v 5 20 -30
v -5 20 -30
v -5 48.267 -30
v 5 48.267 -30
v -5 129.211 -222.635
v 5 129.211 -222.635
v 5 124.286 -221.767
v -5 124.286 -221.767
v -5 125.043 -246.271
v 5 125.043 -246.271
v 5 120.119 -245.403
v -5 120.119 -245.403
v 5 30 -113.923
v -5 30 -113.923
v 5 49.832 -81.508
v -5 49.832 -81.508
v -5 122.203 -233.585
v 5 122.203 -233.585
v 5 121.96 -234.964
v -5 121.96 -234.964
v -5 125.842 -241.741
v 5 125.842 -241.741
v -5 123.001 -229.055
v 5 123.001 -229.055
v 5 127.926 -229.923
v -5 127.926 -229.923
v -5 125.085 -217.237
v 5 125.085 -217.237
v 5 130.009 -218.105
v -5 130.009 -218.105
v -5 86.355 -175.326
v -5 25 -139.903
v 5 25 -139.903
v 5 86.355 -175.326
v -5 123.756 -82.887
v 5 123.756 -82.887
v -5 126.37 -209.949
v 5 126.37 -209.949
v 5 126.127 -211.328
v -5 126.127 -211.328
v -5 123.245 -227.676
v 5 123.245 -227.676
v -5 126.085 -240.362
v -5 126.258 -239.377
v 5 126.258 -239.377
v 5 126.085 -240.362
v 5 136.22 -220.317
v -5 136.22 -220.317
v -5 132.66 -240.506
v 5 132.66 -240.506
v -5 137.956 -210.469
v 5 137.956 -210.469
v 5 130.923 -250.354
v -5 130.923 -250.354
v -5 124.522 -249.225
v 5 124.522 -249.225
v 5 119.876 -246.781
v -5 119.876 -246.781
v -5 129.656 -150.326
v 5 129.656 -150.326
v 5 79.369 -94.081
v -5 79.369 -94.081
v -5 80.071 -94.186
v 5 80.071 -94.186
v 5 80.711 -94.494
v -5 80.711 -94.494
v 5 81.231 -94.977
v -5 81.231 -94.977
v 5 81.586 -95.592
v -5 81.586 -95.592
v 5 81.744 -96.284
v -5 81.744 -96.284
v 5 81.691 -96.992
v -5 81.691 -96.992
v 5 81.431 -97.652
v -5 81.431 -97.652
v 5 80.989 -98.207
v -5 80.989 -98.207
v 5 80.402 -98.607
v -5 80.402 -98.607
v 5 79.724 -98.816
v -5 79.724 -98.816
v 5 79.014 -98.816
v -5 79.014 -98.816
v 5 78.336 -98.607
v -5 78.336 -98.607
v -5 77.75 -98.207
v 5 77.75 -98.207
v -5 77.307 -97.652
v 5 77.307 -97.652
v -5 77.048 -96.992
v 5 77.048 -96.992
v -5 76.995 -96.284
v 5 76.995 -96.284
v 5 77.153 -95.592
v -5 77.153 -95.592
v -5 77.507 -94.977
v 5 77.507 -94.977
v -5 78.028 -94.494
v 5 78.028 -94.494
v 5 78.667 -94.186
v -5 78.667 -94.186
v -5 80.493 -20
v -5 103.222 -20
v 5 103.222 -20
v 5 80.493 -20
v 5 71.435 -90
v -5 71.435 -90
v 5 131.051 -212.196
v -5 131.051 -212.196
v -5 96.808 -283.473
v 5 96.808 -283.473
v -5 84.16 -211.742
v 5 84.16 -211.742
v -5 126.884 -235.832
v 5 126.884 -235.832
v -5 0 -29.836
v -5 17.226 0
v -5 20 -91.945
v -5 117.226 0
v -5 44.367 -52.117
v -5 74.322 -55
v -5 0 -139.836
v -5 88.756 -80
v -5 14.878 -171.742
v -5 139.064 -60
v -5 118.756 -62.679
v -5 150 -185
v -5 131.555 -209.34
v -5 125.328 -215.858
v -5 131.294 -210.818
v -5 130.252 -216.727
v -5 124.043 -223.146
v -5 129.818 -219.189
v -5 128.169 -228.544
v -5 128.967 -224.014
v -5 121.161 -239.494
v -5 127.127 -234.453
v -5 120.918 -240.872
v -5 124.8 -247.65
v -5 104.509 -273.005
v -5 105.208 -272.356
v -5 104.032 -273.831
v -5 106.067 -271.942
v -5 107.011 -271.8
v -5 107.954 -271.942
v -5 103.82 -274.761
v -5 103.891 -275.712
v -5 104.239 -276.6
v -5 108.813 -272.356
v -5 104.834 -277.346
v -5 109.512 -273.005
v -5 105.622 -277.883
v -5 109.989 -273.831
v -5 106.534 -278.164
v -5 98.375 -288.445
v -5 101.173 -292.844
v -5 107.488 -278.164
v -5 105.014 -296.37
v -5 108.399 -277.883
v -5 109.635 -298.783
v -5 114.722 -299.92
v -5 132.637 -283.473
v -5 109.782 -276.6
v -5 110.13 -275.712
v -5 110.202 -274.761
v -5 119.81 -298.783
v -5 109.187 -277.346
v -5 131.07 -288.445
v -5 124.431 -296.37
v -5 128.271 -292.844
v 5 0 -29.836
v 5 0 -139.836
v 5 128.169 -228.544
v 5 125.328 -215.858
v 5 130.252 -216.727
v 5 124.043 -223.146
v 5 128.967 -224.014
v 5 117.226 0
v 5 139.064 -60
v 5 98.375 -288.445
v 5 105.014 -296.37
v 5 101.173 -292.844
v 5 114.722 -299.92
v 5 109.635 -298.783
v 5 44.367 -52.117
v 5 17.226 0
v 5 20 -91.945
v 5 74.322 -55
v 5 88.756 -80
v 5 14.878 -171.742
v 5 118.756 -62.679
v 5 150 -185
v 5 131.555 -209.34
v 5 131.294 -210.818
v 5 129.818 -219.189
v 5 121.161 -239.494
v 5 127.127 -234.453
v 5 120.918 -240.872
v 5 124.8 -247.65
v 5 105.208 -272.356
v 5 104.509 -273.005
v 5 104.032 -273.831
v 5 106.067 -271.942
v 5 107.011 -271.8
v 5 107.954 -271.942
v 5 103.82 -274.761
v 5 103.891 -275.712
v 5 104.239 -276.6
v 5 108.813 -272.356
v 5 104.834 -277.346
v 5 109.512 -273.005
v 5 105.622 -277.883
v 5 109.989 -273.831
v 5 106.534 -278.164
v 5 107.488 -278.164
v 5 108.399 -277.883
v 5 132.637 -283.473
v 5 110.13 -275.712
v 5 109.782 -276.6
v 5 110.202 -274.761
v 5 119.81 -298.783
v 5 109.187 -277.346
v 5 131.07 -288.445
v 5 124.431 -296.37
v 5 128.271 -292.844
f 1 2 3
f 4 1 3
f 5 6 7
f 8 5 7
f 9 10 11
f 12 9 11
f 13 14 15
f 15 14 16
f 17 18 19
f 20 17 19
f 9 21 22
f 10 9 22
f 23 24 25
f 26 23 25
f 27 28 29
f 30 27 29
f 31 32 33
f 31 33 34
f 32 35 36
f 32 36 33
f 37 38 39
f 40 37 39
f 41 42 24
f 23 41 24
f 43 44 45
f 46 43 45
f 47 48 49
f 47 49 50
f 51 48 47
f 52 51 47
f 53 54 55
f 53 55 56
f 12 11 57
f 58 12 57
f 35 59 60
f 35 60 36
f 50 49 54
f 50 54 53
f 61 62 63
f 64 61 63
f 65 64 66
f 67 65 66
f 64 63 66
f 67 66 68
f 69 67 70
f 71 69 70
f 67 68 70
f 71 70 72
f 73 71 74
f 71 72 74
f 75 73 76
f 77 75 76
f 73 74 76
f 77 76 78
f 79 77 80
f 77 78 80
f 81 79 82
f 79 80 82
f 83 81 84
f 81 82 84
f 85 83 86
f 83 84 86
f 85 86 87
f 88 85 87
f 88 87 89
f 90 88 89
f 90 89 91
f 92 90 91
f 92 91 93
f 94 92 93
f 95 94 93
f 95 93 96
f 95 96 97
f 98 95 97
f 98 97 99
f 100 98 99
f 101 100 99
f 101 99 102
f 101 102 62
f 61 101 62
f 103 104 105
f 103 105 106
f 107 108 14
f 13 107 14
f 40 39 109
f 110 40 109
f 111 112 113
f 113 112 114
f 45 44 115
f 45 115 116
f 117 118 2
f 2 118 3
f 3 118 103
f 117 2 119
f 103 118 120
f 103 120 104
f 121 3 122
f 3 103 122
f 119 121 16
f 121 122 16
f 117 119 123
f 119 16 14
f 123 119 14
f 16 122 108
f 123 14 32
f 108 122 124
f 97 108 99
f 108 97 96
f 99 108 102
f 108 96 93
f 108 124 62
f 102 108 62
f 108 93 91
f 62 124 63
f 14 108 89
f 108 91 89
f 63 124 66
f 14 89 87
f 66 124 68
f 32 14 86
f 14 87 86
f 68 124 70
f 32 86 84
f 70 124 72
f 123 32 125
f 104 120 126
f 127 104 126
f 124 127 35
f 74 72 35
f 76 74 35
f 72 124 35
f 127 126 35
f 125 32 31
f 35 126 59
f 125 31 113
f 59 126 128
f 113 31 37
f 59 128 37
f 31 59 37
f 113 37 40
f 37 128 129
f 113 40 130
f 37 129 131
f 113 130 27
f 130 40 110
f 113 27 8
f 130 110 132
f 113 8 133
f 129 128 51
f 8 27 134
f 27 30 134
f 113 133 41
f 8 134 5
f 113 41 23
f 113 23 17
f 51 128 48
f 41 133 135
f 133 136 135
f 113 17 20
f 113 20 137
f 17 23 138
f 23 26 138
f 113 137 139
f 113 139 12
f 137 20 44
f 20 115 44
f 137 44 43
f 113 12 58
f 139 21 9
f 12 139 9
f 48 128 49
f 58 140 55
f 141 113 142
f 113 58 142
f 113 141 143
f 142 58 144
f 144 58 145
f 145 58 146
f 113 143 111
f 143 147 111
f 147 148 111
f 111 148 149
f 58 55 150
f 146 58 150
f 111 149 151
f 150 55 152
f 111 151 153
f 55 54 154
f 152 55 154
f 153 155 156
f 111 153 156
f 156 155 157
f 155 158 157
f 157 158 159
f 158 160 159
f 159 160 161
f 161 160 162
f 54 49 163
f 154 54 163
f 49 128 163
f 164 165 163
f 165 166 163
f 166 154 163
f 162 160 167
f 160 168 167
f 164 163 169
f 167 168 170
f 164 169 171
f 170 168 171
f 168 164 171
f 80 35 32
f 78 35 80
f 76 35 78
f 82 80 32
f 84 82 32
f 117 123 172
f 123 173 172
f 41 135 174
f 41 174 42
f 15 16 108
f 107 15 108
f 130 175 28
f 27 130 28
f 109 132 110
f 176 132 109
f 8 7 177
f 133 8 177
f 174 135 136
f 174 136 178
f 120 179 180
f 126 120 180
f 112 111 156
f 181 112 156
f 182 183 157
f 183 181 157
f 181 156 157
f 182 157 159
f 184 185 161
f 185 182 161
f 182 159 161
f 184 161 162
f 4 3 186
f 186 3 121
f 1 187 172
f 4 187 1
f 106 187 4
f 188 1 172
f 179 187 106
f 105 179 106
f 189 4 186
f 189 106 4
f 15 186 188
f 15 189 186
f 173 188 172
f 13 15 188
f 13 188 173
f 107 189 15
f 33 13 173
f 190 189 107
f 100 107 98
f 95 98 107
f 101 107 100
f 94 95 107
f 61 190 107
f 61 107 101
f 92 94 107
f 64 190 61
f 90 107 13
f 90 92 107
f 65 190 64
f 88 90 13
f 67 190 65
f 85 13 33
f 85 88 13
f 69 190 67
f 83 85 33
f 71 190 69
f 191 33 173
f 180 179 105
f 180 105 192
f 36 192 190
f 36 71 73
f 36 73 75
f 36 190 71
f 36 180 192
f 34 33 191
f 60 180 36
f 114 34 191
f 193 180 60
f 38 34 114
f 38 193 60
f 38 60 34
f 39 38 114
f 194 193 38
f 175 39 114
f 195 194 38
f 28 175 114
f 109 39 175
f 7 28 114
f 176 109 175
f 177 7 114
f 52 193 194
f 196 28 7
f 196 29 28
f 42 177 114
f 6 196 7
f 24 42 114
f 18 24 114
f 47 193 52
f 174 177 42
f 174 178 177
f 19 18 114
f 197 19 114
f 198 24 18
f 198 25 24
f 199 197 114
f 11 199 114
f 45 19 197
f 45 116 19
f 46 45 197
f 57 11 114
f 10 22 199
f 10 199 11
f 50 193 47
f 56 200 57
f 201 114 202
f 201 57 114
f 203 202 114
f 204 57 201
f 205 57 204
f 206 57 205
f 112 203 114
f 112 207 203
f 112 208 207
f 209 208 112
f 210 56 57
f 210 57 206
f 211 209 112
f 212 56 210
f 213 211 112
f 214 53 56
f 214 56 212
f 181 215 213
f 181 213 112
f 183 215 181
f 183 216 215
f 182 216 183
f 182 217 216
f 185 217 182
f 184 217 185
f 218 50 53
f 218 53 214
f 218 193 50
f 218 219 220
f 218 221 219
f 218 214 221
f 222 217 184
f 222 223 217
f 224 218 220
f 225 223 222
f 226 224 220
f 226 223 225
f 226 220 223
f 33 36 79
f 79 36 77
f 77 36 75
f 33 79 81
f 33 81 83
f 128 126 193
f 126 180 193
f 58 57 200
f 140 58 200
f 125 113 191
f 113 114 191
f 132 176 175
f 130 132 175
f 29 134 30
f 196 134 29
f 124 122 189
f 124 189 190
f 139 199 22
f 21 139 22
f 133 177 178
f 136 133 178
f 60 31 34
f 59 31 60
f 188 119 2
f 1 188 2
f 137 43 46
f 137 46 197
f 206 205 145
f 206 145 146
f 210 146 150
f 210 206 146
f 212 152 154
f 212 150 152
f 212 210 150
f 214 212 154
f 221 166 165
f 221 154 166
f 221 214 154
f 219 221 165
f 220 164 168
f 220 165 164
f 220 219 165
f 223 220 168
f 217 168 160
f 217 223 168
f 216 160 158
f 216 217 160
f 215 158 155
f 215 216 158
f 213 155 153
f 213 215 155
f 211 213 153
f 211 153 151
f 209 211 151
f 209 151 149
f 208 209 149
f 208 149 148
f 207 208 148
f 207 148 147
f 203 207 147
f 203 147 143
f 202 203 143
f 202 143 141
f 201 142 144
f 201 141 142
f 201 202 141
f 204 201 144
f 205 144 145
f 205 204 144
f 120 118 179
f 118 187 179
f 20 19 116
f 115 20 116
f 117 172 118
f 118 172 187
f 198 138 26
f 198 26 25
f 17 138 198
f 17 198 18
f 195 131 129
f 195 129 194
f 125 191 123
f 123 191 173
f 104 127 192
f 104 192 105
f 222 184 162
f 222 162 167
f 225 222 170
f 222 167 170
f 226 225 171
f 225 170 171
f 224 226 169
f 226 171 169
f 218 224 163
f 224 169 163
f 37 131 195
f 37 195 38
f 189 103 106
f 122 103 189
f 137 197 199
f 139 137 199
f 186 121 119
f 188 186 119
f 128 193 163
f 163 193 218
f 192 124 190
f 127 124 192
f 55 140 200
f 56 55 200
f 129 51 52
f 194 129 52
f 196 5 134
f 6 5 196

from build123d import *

# Parameters (mm, degrees)
ESQUISSE1_W                             = 300
ESQUISSE1_H                             = 150
BOSS_EXTRU_1_DEPTH                      = 5
ESQUISSE2_OUTSIDE_W                     = 369.112
ESQUISSE2_OUTSIDE_H                     = 219.112
ENL_V_MAT_EXTRU_1_DEPTH                 = 5
ENL_V_MAT_EXTRU_2_DEPTH                 = 336.559234711
ENL_V_MAT_EXTRU_2_DEPTH_BACK            = 336.559234711
ENL_V_MAT_EXTRU_4_DEPTH                 = 336.559234711
ENL_V_MAT_EXTRU_4_DEPTH_BACK            = 336.559234711
ESQUISSE5_R                             = 3.2
EMPREINTE1_START                        = -213.565883238
EMPREINTE1_OUTLINE_W                    = 10
EMPREINTE1_OUTLINE_H                    = 6
EMPREINTE1_DEPTH                        = 20
D_PLACER_START                          = -213.815883238
D_PLACER_LA_FACE1_OUTLINE_W             = 10
D_PLACER_LA_FACE1_OUTLINE_H             = 6.5
D_PLACER_LA_FACE1_DEPTH                 = 20.5
D_PLACER_LA_FACE2_BY                    = 10
D_PLACER_LA_FACE3_BY                    = 10
ENL_V_MAT_EXTRU_5_DEPTH                 = 336.559234711
R_P_TITION_LIN_AIRE1_COUNT              = 7
R_P_TITION_LIN_AIRE1_PITCH              = 6
CONG_1_R                                = 20
PER_AGE_POUR_CROUS_AUTO_BLOQUANTS_300_D = 4.7625


# Read off the part's stored shape, not the designer's step: Empreinte1, Déplacer la face1
with BuildPart() as part:
    # Esquisse1 → Boss.-Extru.1 (new, symmetric)
    with BuildSketch(Plane(origin=(0, 0, 0), x_dir=(0, 0, -1), z_dir=(1, 0, 0))):
        with Locations((150, 75)):
            Rectangle(ESQUISSE1_W, ESQUISSE1_H)
    extrude(amount=BOSS_EXTRU_1_DEPTH, both=True)

    # Esquisse2 outside → Enlèv. mat.-Extru.1 (cut, symmetric)
    with BuildSketch(Plane(origin=(0, 0, 0), x_dir=(0, 0, -1), z_dir=(1, 0, 0))):
        with Locations((150, 75)):
            Rectangle(ESQUISSE2_OUTSIDE_W, ESQUISSE2_OUTSIDE_H)
        Polygon((0, 117.225703003), (60, 139.063917059), (185, 150), (300, 129.722397219), (300, 99.722397219), (211.741963761, 84.160124165), (171.741963761, 14.878091862), (139.835792798, 0), (29.835792798, 0), (0, 17.225703003), align=None, mode=Mode.SUBTRACT)
    extrude(amount=ENL_V_MAT_EXTRU_1_DEPTH, both=True, mode=Mode.SUBTRACT)

    # Esquisse3 → Enlèv. mat.-Extru.2 (cut, two sides: drawn at the far end of the back side and taken through both)
    with BuildSketch(Plane(origin=(5, 0, 0), x_dir=(0, 0, -1), z_dir=(1, 0, 0)).offset(-ENL_V_MAT_EXTRU_2_DEPTH_BACK)):
        Polygon((20, 103.221552239), (20, 80.493304508), (55, 74.321860183), (80, 88.755616913), (62.679491924, 118.755616913), align=None)
        Polygon((90, 71.435108837), (113.922571241, 30), (81.508057782, 49.831775443), align=None)
        Polygon((82.886751346, 123.755616913), (139.903333355, 25), (175.32640016, 86.354551467), (150.32640016, 129.655821657), align=None)
        Polygon((91.944969354, 20), (30, 20), (30, 48.267236345), (52.117107943, 44.367393479), align=None)
    extrude(amount=ENL_V_MAT_EXTRU_2_DEPTH + ENL_V_MAT_EXTRU_2_DEPTH_BACK, mode=Mode.SUBTRACT)

    # Esquisse5 → Enlèv. mat.-Extru.4 (cut, two sides: drawn at the far end of the back side and taken through both)
    with BuildSketch(Plane.ZY.offset(5).offset(-ENL_V_MAT_EXTRU_4_DEPTH_BACK)):
        with Locations((-275, 107.010571736)):
            Circle(ESQUISSE5_R)
    extrude(amount=ENL_V_MAT_EXTRU_4_DEPTH + ENL_V_MAT_EXTRU_4_DEPTH_BACK, mode=Mode.SUBTRACT)

    # Empreinte1 outline → Empreinte1 (cut)
    with BuildSketch(Plane(origin=(0, 0, 0), x_dir=(1, 0, 0), z_dir=(0, 0.173648177666931, 0.984807753012208)).offset(EMPREINTE1_START)):
        with Locations((0, 169.157749671)):
            Rectangle(EMPREINTE1_OUTLINE_W, EMPREINTE1_OUTLINE_H)
    extrude(amount=EMPREINTE1_DEPTH, mode=Mode.SUBTRACT)

    # Déplacer la face1 outline → Déplacer la face1 (cut)
    with BuildSketch(Plane(origin=(0, 0, 0), x_dir=(1, 0, 0), z_dir=(0, 0.173648177666931, 0.984807753012208)).offset(D_PLACER_START)):
        with Locations((0, 169.157749671)):
            Rectangle(D_PLACER_LA_FACE1_OUTLINE_W, D_PLACER_LA_FACE1_OUTLINE_H)
    extrude(amount=D_PLACER_LA_FACE1_DEPTH, mode=Mode.SUBTRACT)

    # Déplacer la face2: a face moved inward by 10.0
    extrude(part.faces().sort_by_distance((0, 133.01891252, -219.752915562))[0], amount=D_PLACER_LA_FACE2_BY, dir=(0, 0.173648178, 0.984807753), mode=Mode.SUBTRACT)

    # Déplacer la face3: a face moved inward by 10.0
    extrude(part.faces().sort_by_distance((0, 129.459124878, -239.941474499))[0], amount=D_PLACER_LA_FACE3_BY, dir=(0, -0.173648178, -0.984807753), mode=Mode.SUBTRACT)

    # Esquisse6 → Enlèv. mat.-Extru.5 (cut, through all)
    with BuildSketch(Plane(origin=(5, 0, 0), x_dir=(0, 0, -1), z_dir=(1, 0, 0))):
        Polygon((210.817693083, 131.294296833), (209.949452195, 126.370258067), (211.328183049, 126.127150619), (212.196423938, 131.051189384), align=None)
    enl_v_mat_extru_5 = extrude(amount=-ENL_V_MAT_EXTRU_5_DEPTH, mode=Mode.SUBTRACT)

    # Répétition linéaire1: Enlèv. mat.-Extru.5 ×7
    with Locations(*[Vector(0, -0.17364817766693066, -0.9848077530122081) * (i * R_P_TITION_LIN_AIRE1_PITCH) for i in range(1, R_P_TITION_LIN_AIRE1_COUNT)]):
        add(enl_v_mat_extru_5, mode=Mode.SUBTRACT)

    # Congé1
    # the kernel refuses this fillet: 20 mm, written as the material it takes off along each edge
    with BuildSketch(Plane(origin=(-46.954981559, 129.722397219, -300), x_dir=(0, 0.17364817766693125, 0.9848077530122079), z_dir=(1, 0, 0))) as cong_1_piece_1:
        with BuildLine():
            CenterArc((CONG_1_R * 0.839099631177, CONG_1_R), CONG_1_R, 190, 80)
            Line((-CONG_1_R * 0.145708121835, CONG_1_R * 0.826351822333), (0, 0))
            Line((0, 0), (CONG_1_R * 0.839099631177, 0))
        make_face()
    extrude(amount=93.909963118, mode=Mode.SUBTRACT)
    with BuildSketch(Plane(origin=(-46.954981559, 99.722397219, -300), x_dir=(0, -0.17364817766692434, 0.984807753012209), z_dir=(1, 0, 0))) as cong_1_piece_2:
        with BuildLine():
            CenterArc((CONG_1_R * 0.839099631177, -CONG_1_R), CONG_1_R, 90, 80)
            Line((-CONG_1_R * 0.145708121835, -CONG_1_R * 0.826351822333), (0, 0))
            Line((0, 0), (CONG_1_R * 0.839099631177, 0))
        make_face()
    extrude(amount=93.909963118, mode=Mode.SUBTRACT)

    # Perçage pour écrous auto-bloquants 300® #6 (SP)1 (through all)
    with Locations(Plane(origin=(5, 0, 0), x_dir=(0, 0, -1), z_dir=(1, 0, 0))):
        with Locations((96.461753504, 79.36920384)):
            Hole(PER_AGE_POUR_CROUS_AUTO_BLOQUANTS_300_D / 2)


solid = part.part
